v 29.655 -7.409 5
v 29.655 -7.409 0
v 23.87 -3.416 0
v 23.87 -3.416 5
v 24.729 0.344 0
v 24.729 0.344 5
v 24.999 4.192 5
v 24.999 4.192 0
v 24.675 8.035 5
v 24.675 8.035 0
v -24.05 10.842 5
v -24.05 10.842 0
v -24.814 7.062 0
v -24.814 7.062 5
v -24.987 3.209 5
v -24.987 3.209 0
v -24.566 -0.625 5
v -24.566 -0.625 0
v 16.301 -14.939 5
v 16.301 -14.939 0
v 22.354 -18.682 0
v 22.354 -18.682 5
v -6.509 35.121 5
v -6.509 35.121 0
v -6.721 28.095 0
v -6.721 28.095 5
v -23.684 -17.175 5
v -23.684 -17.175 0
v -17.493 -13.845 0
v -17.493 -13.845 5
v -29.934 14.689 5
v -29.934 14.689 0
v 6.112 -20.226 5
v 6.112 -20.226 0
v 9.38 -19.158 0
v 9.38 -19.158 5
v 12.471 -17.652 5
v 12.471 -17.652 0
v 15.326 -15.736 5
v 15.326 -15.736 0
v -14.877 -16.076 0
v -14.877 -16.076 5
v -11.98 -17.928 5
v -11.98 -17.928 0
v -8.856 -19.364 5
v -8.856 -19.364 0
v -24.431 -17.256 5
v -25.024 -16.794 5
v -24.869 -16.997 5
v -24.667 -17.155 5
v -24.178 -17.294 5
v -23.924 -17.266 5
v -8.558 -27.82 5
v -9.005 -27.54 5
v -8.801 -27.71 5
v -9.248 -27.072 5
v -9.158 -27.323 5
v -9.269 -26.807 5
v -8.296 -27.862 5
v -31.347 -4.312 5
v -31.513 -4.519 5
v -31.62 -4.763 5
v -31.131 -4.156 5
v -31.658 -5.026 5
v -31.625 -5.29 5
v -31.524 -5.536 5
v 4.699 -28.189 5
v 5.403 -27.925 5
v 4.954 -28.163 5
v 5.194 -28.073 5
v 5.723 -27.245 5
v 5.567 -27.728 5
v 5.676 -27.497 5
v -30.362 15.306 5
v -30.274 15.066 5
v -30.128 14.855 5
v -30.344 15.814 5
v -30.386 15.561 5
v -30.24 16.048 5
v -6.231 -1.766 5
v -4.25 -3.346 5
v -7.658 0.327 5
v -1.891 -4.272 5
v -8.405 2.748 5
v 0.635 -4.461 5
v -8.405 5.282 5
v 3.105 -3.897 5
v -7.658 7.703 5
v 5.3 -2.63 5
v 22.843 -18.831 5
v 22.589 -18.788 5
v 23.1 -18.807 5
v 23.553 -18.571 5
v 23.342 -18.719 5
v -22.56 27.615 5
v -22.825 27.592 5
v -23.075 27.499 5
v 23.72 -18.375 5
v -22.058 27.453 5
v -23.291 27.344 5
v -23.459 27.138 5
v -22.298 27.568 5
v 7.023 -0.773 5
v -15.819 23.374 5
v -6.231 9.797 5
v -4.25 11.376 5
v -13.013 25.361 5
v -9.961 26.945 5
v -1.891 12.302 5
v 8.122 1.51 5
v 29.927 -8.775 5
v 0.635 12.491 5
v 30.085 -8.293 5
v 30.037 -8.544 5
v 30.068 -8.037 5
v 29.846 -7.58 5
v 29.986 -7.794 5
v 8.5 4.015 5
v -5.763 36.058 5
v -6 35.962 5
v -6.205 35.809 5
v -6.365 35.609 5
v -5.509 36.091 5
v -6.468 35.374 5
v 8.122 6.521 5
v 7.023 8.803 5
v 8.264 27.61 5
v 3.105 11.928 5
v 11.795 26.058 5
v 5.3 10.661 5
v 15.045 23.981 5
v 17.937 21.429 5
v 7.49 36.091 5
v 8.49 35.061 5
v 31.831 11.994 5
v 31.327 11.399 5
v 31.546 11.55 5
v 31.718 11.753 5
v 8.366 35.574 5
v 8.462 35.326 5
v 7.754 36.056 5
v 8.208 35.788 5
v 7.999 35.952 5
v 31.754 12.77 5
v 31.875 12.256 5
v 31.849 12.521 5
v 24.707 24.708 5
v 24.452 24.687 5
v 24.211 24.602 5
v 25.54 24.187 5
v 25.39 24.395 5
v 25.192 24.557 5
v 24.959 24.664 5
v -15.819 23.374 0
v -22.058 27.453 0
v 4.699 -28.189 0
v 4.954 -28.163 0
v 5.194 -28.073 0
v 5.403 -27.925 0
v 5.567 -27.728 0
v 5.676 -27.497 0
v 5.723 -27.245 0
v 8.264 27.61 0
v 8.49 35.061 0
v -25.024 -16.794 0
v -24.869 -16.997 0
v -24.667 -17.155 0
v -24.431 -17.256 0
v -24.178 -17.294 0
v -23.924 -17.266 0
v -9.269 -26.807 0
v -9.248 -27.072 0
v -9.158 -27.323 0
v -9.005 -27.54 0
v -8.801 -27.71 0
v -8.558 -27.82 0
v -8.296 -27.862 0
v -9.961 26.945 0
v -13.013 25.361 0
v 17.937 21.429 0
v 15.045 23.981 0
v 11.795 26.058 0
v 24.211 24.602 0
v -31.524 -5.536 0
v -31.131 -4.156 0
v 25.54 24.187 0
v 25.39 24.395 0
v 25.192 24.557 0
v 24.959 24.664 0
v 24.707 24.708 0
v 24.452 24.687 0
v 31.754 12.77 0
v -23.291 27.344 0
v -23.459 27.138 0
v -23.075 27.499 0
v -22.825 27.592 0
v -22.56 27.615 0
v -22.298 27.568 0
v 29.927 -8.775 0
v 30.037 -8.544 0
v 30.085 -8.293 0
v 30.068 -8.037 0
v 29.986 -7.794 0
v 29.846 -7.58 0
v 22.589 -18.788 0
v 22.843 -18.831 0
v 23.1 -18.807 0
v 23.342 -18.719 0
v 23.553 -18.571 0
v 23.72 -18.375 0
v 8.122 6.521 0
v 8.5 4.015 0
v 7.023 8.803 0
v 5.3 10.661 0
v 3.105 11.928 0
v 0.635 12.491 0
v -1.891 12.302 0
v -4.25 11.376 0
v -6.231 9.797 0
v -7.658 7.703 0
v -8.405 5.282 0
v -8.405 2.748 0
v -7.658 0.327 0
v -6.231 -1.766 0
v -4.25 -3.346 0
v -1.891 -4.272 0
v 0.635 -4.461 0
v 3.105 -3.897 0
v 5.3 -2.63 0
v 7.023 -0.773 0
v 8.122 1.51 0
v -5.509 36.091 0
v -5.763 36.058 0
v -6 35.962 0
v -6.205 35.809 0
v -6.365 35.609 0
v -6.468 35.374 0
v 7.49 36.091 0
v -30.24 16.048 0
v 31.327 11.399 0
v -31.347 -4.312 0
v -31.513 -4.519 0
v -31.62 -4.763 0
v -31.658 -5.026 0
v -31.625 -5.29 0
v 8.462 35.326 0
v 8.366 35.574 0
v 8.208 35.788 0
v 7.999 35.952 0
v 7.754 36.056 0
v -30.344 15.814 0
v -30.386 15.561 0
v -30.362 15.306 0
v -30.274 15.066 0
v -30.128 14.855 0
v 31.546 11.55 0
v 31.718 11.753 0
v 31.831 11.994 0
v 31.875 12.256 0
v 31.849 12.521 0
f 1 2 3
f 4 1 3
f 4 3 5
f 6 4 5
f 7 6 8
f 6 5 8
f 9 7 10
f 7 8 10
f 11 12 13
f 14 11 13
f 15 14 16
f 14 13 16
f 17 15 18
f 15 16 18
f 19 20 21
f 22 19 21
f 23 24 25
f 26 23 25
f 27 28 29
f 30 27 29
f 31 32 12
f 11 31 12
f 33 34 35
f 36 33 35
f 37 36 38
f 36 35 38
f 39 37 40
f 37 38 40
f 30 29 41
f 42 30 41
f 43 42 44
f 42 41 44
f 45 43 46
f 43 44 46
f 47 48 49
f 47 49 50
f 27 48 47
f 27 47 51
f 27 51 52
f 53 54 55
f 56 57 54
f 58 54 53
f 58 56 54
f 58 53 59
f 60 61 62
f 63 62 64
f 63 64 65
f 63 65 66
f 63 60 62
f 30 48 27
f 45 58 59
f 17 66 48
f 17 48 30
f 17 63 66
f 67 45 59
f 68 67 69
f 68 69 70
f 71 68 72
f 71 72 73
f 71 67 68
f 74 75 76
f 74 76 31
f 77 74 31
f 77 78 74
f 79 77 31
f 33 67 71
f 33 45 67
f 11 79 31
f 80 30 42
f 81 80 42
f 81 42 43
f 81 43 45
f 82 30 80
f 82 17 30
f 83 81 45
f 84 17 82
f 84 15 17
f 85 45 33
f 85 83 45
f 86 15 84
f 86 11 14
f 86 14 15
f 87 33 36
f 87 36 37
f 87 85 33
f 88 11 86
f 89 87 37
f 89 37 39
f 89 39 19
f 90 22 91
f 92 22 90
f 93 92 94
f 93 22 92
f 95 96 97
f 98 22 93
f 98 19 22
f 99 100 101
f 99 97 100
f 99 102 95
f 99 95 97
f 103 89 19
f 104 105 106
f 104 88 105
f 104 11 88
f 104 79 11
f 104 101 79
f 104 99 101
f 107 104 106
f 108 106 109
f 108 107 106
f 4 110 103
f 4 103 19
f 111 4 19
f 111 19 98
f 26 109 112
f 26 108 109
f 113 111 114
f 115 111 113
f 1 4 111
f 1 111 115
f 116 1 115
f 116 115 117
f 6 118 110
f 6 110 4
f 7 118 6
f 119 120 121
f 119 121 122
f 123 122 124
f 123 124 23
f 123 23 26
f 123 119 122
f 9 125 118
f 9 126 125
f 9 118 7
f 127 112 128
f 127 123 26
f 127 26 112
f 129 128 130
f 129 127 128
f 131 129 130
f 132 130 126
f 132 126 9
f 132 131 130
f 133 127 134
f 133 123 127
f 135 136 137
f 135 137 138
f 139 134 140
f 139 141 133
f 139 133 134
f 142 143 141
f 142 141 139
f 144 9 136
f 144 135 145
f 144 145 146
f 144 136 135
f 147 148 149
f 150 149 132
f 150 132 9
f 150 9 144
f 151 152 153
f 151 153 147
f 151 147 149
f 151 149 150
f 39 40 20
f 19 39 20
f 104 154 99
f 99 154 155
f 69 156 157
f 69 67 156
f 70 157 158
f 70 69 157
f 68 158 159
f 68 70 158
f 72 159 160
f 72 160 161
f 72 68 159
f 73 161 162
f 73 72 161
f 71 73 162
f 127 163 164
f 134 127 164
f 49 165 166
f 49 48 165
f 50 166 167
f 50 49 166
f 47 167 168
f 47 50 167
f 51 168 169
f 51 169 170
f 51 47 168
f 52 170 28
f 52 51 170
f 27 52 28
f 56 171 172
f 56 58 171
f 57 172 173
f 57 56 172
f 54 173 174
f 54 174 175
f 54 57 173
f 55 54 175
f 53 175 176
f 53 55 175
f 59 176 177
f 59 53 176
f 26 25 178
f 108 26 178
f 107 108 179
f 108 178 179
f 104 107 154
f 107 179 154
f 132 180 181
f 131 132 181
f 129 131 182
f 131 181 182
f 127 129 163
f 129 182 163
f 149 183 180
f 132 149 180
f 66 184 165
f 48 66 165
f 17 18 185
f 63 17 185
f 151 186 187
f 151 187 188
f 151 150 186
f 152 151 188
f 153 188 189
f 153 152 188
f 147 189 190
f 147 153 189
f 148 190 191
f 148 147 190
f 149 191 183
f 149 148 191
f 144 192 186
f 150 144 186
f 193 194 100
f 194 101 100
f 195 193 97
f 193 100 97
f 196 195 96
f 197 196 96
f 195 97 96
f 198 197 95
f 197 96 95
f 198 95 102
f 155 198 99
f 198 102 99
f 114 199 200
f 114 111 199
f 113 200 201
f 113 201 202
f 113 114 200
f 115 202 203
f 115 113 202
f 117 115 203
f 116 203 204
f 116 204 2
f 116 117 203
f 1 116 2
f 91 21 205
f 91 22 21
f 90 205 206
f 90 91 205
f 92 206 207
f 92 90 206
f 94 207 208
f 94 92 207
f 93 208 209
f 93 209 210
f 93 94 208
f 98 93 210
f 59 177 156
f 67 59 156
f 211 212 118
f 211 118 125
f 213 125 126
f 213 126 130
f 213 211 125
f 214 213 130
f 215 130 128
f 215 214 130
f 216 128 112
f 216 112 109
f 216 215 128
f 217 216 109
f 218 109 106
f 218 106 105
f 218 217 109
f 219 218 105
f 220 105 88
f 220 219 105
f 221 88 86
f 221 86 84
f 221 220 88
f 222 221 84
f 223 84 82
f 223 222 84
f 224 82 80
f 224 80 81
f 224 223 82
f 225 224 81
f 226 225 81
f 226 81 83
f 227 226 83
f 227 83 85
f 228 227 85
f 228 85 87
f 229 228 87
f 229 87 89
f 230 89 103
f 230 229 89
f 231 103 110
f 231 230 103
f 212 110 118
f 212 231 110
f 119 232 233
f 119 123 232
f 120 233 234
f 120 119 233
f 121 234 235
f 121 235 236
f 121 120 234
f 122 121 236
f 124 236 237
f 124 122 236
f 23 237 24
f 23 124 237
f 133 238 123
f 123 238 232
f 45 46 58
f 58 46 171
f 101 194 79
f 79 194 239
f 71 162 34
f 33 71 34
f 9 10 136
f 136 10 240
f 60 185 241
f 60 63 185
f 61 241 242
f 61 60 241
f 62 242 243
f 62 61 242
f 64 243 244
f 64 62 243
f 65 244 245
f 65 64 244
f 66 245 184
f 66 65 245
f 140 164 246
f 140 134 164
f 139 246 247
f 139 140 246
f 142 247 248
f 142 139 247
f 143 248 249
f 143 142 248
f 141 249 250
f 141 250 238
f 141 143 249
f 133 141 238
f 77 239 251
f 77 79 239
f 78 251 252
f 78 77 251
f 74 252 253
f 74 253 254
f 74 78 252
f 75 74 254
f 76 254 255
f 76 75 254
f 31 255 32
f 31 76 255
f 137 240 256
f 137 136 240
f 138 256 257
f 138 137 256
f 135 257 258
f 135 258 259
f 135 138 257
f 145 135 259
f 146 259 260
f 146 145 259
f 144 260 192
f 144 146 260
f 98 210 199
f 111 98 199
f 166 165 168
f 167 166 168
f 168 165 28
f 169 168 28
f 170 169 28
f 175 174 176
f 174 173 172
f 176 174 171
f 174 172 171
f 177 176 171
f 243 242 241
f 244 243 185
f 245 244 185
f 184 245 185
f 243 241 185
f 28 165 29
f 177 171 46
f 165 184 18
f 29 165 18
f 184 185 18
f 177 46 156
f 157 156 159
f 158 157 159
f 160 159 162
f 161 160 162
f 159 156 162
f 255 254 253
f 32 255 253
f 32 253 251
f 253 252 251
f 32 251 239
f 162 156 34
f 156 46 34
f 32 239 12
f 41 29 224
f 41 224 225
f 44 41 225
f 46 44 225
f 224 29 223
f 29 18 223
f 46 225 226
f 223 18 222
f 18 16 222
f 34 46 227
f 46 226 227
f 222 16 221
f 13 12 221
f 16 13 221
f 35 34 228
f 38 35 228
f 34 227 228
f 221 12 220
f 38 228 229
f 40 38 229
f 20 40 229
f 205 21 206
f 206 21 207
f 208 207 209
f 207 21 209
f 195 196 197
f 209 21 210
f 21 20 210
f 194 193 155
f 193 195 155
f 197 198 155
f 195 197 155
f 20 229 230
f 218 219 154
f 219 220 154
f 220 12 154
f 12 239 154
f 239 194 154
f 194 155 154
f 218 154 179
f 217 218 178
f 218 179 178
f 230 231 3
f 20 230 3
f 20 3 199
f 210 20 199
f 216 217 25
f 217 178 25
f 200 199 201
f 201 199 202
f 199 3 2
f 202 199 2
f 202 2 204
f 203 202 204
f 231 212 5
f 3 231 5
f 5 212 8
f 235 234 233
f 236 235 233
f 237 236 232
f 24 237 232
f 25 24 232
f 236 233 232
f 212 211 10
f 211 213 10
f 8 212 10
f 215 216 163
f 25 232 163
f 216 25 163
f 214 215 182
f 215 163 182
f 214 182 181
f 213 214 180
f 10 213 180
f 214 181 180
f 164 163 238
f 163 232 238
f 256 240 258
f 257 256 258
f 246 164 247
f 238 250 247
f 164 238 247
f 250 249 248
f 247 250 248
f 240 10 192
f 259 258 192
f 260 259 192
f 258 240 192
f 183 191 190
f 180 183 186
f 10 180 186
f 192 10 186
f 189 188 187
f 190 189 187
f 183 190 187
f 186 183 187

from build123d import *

# Parameters (mm, degrees)
F0_R     = 8.5
F1_DEPTH = 5
F2_R     = 1
F3_R     = 1
F4_R     = 1
F5_R     = 1
F6_R     = 1
F7_R     = 1
F8_R     = 1


with BuildPart() as f1:
    # F0 (on Top) → F1 (new body)
    with BuildSketch(Plane.XY):
        with BuildLine():
            Line((-6.479281, 36.091168), (-6.720968, 28.09482))
            ThreePointArc((-6.720968, 28.09482), (-11.514328, 26.205734), (-15.818653, 23.374172))
            Line((-15.818653, 23.374172), (-22.920961, 28.017285))
            Line((-22.920961, 28.017285), (-30.745783, 15.219936))
            Line((-30.745783, 15.219936), (-24.049722, 10.842405))
            ThreePointArc((-24.049722, 10.842405), (-24.974739, 5.138761), (-24.565617, -0.624904))
            Line((-24.565617, -0.624904), (-32.038972, -4.643641))
            Line((-32.038972, -4.643641), (-24.538972, -17.634022))
            Line((-24.538972, -17.634022), (-17.493087, -13.845154))
            ThreePointArc((-17.493087, -13.845154), (-13.460411, -17.051783), (-8.856044, -19.363657))
            Line((-8.856044, -19.363657), (-9.325944, -27.835993))
            Line((-9.325944, -27.835993), (5.669297, -28.213812))
            Line((5.669297, -28.213812), (6.112319, -20.226088))
            ThreePointArc((6.112319, -20.226088), (10.95174, -18.458337), (15.326021, -15.736091))
            Line((15.326021, -15.736091), (16.301248, -14.939212))
            Line((16.301248, -14.939212), (23.187839, -19.197642))
            Line((23.187839, -19.197642), (30.453803, -7.960425))
            Line((30.453803, -7.960425), (23.870128, -3.415624))
            ThreePointArc((23.870128, -3.415624), (24.938515, 2.262912), (24.674697, 8.035054))
            Line((24.674697, 8.035054), (32.246905, 11.864276))
            Line((32.246905, 11.864276), (25.076486, 25.039446))
            Line((25.076486, 25.039446), (17.937403, 21.429252))
            ThreePointArc((17.937403, 21.429252), (13.460411, 25.082162), (8.264369, 27.609685))
            Line((8.264369, 27.609685), (8.520719, 36.091168))
            Line((8.520719, 36.091168), (-6.479281, 36.091168))
        make_face()
        with Locations((0, 4.01519)):
            Circle(F0_R, mode=Mode.SUBTRACT)
    extrude(amount=F1_DEPTH)

    # F2
    f2_edges = [f1.edges().sort_by_distance(p)[0] for p in [
        (-24.538972, -17.634022, 2.5),
        (-32.038972, -4.643641, 2.5),
    ]]
    fillet(f2_edges, radius=F2_R)

    # F3
    f3_edges = [f1.edges().sort_by_distance(p)[0] for p in [
        (-9.325944, -27.835993, 2.5),
    ]]
    fillet(f3_edges, radius=F3_R)

    # F4
    f4_edges = [f1.edges().sort_by_distance(p)[0] for p in [
        (-22.920961, 28.017285, 2.5),
    ]]
    fillet(f4_edges, radius=F4_R)

    # F5
    f5_edges = [f1.edges().sort_by_distance(p)[0] for p in [
        (-30.745783, 15.219936, 2.5),
    ]]
    fillet(f5_edges, radius=F5_R)

    # F6
    f6_edges = [f1.edges().sort_by_distance(p)[0] for p in [
        (5.669297, -28.213812, 2.5),
    ]]
    fillet(f6_edges, radius=F6_R)

    # F7
    f7_edges = [f1.edges().sort_by_distance(p)[0] for p in [
        (23.187839, -19.197642, 2.5),
        (30.453803, -7.960425, 2.5),
        (32.246905, 11.864276, 2.5),
    ]]
    fillet(f7_edges, radius=F7_R)

    # F8
    f8_edges = [f1.edges().sort_by_distance(p)[0] for p in [
        (25.076486, 25.039446, 2.5),
        (8.520719, 36.091168, 2.5),
        (-6.479281, 36.091168, 2.5),
    ]]
    fillet(f8_edges, radius=F8_R)


solid = f1.part
